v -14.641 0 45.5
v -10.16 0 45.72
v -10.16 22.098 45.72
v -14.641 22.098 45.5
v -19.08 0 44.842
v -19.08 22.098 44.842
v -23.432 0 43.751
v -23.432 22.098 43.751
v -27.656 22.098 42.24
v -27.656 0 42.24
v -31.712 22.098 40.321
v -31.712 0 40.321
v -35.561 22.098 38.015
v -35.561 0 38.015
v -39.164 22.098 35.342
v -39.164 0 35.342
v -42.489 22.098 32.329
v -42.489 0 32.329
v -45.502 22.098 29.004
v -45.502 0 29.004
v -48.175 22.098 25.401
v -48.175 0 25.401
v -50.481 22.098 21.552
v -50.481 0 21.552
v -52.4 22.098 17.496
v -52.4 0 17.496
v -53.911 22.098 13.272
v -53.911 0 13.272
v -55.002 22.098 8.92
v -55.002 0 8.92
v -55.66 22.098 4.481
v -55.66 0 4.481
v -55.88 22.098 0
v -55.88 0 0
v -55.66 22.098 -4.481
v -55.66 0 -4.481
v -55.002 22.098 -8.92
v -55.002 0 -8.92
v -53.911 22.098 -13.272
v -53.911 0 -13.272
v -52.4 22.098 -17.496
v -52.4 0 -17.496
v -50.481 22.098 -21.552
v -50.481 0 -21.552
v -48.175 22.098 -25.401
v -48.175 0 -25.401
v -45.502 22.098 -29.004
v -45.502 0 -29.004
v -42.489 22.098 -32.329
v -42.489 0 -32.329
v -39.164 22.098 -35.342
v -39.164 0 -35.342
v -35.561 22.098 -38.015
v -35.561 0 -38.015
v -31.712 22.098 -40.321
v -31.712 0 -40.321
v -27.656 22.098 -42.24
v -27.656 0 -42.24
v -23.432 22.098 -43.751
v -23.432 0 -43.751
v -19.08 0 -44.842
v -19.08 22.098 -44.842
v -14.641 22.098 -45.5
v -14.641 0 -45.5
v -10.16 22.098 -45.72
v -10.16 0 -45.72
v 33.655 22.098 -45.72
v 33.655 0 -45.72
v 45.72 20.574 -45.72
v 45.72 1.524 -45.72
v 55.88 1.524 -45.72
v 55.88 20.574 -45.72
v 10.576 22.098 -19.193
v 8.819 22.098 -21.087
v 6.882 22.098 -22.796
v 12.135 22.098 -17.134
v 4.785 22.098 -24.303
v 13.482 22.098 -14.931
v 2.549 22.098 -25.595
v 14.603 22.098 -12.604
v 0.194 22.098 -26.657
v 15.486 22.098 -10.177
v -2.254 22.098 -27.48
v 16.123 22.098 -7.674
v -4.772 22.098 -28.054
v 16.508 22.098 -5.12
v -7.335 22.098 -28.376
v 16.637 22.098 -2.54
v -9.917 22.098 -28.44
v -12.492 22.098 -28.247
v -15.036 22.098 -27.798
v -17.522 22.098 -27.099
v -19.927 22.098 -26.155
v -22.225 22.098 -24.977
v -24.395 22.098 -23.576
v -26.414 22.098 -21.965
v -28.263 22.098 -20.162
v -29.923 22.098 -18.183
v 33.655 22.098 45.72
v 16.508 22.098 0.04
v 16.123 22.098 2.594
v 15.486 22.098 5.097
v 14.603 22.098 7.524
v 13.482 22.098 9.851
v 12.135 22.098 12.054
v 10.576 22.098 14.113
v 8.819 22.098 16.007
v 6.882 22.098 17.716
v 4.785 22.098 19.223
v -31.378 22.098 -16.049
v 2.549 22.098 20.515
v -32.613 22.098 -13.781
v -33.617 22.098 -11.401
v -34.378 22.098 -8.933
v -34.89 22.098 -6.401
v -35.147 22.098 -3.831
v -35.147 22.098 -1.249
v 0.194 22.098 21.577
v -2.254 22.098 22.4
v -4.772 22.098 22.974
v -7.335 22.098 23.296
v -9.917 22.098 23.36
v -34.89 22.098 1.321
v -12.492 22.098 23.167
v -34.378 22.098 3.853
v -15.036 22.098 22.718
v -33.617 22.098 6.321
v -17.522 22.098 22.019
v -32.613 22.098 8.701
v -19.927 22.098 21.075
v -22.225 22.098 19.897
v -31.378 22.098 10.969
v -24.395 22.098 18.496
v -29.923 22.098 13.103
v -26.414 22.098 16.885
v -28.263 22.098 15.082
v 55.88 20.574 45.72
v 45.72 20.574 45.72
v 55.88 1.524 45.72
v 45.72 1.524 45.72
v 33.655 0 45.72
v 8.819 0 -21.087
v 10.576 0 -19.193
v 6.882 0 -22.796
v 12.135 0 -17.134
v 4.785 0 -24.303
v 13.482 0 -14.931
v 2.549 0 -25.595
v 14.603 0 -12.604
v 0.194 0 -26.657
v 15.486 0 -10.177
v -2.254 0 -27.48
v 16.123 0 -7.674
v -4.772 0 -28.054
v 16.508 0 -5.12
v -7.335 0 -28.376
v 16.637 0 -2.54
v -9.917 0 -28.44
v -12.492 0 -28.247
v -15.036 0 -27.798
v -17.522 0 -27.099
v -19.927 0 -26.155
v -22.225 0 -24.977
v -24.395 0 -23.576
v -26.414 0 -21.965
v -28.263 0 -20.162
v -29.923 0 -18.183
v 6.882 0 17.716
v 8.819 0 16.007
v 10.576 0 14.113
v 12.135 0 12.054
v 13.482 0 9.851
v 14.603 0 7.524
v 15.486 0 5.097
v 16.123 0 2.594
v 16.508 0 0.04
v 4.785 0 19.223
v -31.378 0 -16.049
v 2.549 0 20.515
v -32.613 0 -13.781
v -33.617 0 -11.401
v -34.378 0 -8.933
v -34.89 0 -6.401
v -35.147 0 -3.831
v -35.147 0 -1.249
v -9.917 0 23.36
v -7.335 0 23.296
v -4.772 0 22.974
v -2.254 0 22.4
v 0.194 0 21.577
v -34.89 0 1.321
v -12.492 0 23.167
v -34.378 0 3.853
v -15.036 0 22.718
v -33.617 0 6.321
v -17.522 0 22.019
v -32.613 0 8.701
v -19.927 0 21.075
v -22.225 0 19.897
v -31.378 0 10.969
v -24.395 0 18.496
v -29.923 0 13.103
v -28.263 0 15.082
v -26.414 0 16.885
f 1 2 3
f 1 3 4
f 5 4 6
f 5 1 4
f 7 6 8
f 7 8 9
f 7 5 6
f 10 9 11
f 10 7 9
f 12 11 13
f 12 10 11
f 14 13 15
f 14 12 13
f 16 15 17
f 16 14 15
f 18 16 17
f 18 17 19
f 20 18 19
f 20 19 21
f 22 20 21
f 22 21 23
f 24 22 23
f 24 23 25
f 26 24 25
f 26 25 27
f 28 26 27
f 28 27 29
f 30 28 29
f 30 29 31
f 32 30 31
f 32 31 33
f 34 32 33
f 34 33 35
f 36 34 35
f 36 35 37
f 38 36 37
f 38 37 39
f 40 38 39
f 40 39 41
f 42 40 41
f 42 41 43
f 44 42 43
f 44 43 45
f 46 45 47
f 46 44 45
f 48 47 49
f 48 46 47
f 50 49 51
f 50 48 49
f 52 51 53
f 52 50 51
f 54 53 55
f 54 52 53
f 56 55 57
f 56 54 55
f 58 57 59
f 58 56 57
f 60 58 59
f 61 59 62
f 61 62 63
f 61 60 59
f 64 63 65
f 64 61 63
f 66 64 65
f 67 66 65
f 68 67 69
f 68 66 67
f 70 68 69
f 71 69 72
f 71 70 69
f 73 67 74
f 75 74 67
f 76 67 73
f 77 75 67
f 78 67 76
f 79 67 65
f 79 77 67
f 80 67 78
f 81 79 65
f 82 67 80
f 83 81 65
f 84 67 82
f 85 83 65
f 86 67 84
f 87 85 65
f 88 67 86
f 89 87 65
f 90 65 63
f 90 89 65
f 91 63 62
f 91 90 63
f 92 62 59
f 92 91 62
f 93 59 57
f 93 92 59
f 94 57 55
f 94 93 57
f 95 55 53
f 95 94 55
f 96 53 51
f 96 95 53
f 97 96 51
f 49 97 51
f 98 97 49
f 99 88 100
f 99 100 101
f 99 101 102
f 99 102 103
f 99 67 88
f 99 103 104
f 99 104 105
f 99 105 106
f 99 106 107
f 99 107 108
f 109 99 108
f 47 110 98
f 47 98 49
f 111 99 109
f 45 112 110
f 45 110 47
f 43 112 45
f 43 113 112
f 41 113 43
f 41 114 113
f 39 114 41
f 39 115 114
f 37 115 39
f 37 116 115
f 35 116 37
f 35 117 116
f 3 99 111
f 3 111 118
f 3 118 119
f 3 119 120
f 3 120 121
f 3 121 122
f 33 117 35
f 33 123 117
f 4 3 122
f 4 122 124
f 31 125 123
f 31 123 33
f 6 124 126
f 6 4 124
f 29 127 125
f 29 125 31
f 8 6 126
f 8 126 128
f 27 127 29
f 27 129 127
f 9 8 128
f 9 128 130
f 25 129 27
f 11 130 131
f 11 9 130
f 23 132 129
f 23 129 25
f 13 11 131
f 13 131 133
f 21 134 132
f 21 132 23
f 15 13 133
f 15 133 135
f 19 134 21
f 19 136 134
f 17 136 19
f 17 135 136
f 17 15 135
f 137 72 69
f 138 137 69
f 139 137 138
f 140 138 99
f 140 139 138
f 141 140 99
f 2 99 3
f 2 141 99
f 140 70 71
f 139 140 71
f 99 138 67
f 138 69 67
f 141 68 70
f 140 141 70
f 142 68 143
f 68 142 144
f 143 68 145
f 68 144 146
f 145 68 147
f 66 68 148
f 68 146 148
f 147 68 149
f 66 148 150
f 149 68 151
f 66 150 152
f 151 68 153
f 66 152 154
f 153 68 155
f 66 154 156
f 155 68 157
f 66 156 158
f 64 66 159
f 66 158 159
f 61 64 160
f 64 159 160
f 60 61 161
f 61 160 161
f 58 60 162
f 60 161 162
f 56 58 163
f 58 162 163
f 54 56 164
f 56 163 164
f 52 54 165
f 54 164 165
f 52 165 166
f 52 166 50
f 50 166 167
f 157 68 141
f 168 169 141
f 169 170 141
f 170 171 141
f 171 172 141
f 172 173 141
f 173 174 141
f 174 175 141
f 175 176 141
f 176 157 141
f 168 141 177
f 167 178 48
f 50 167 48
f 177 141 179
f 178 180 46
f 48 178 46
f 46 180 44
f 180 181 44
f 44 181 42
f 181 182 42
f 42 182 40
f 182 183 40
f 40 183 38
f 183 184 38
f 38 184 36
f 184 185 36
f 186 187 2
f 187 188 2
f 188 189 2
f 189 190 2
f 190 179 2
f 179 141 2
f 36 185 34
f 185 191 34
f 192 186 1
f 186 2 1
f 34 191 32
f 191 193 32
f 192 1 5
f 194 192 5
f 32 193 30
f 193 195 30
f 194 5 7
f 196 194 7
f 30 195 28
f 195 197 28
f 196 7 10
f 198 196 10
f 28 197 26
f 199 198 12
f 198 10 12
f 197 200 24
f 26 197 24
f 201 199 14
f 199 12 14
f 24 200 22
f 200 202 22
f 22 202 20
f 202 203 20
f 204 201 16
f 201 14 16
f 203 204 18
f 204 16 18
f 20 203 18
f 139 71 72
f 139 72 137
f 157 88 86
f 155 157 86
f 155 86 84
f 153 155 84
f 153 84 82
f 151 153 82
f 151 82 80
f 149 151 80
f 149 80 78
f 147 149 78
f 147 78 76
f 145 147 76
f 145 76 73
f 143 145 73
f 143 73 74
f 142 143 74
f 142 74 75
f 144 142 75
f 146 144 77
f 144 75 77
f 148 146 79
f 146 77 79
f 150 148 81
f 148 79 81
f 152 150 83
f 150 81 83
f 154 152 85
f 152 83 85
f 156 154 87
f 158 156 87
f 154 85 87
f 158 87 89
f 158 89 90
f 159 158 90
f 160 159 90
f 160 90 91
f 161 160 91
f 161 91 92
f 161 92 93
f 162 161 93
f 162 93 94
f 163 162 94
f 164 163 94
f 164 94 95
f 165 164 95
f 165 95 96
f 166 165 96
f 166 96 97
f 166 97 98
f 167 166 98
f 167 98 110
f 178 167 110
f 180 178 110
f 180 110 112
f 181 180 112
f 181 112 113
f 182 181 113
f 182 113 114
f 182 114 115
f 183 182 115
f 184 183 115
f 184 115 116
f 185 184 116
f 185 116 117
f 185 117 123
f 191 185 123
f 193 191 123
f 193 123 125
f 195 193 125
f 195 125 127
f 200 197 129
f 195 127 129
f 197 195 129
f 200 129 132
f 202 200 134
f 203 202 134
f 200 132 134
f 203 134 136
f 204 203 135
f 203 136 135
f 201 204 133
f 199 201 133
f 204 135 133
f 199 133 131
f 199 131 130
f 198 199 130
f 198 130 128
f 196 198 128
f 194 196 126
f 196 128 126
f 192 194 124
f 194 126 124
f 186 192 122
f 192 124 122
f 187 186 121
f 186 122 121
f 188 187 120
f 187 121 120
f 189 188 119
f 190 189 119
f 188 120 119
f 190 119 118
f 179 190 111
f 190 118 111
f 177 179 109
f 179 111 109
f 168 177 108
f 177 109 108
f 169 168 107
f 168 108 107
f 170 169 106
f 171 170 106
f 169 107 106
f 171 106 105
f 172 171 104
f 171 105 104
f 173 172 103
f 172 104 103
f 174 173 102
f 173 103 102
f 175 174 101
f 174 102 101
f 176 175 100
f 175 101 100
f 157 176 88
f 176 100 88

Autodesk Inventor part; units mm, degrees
ref_plane "YZ Plane" through (0, 0, 0) normal (1, 0, 0) x (0, 1, 0)
ref_plane "XZ Plane" through (0, 0, 0) normal (0, 1, 0) x (-1, 0, 0)
ref_plane "XY Plane" through (0, 0, 0) normal (0, 0, 1) x (1, 0, 0)
sketch "Sketch1" plane through (0, 0, 0) normal (0, 1, 0) x (-1, 0, 0)
  line L0 (-55.88, 45.72) -> (55.88, 45.72)
  line L1 (55.88, 45.72) -> (55.88, -45.72)
  line L2 (55.88, -45.72) -> (-55.88, -45.72)
  line L3 (-55.88, -45.72) -> (-55.88, 45.72)
  line L4 (-55.88, 45.72) -> (55.88, -45.72) construction
  line L5 (55.88, 45.72) -> (-55.88, -45.72) construction
  circle A0 centre (10.16, 0) radius 45.72
  point P0 (0, 0)
  point P1 (10.16, -45.72)
  point P2 (10.16, 45.72)
  dimension "d0" = 111.76
  dimension "d1" = 91.44
extrude "Extrusion1" add sketch "Sketch1" along normal blind 22.098 contours L0 A0 L2 L3 | A0
sketch "Sketch2" plane through (55.88, 0, -45.72) normal (0, 0, -1) x (-1, 0, 0)
  line L0 (66.04, 22.098) -> (0, 22.098) projected
  line L1 (66.04, 0) -> (0, 0) projected
  line L2 (0, 22.098) -> (10.16, 22.098)
  line L3 (10.16, 22.098) -> (10.16, 0)
  line L4 (10.16, 0) -> (0, 0)
  line L5 (0, 0) -> (0, 22.098)
  line L6 (5.08, 22.098) -> (5.08, 0)
  line L7 (0, 11.049) -> (10.16, 11.049)
  line L8 (0, 20.574) -> (10.16, 20.574)
  line L9 (10.16, 20.574) -> (10.16, 1.524)
  line L10 (10.16, 1.524) -> (0, 1.524)
  line L11 (0, 1.524) -> (0, 20.574)
  line L12 (0, 20.574) -> (10.16, 1.524) construction
  line L13 (10.16, 20.574) -> (0, 1.524) construction
  line L14 (10.16, 22.098) -> (22.225, 22.098)
  line L15 (22.225, 22.098) -> (22.225, 0)
  line L16 (22.225, 0) -> (10.16, 0)
  line L17 (10.16, 0) -> (10.16, 22.098)
  line L18 (10.16, 20.574) -> (22.225, 22.098)
  line L19 (22.225, 0) -> (10.16, 1.524)
  line L20 (5.08, 1.524) -> (10.16, 1.524)
  line L21 (5.08, 20.574) -> (10.16, 20.574)
  point P0 (55.88, 0)
  point P1 (5.08, 11.049)
  dimension "d4" = 10.16
  dimension "d5" = 19.05
  dimension "d6" = 12.065
extrude "Extrusion2" cut sketch "Sketch2" against normal blind 254 contours L18 L3 L0 | L3 L8 L6 L0 | L1 L3 L19 | L6 L8 L5 L0 | L1 L6 L10 L3 | L1 L5 L10 L6
sketch "Sketch3" plane through (0, 22.098, 0) normal (0, 1, 0) x (1, 0, 0)
  line L0 (-10.16, -45.72) -> (33.655, -45.72) projected
  line L1 (33.655, -45.72) -> (33.655, -23.368)
  line L2 (33.655, 45.72) -> (33.655, -45.72) projected
  line L3 (33.655, -23.368) -> (-49.457, -23.368)
  arc A0 (-10.16, 45.72) -> (-10.16, -45.72) centre (-10.16, 0) ccw projected
  line L4 (45.72, 45.72) -> (33.655, 45.72) projected
  line L5 (33.655, 45.72) -> (33.655, 28.448)
  line L6 (33.655, 28.448) -> (-45.9515, 28.448)
  line L7 (55.88, -45.72) -> (55.88, 45.72) projected
  line L8 (55.88, 28.448) -> (16.637, 28.448)
  line L9 (16.637, 28.448) -> (16.637, -23.368)
  circle A1 centre (-9.271, 2.54) radius 25.908
  point P0 (0, 0)
  dimension "d9" = 22.352
  dimension "d10" = 17.272
  dimension "d11" = 39.243
extrude "Extrusion3" cut sketch "Sketch3" against normal blind 254 contours A1
properties part number "fan"
